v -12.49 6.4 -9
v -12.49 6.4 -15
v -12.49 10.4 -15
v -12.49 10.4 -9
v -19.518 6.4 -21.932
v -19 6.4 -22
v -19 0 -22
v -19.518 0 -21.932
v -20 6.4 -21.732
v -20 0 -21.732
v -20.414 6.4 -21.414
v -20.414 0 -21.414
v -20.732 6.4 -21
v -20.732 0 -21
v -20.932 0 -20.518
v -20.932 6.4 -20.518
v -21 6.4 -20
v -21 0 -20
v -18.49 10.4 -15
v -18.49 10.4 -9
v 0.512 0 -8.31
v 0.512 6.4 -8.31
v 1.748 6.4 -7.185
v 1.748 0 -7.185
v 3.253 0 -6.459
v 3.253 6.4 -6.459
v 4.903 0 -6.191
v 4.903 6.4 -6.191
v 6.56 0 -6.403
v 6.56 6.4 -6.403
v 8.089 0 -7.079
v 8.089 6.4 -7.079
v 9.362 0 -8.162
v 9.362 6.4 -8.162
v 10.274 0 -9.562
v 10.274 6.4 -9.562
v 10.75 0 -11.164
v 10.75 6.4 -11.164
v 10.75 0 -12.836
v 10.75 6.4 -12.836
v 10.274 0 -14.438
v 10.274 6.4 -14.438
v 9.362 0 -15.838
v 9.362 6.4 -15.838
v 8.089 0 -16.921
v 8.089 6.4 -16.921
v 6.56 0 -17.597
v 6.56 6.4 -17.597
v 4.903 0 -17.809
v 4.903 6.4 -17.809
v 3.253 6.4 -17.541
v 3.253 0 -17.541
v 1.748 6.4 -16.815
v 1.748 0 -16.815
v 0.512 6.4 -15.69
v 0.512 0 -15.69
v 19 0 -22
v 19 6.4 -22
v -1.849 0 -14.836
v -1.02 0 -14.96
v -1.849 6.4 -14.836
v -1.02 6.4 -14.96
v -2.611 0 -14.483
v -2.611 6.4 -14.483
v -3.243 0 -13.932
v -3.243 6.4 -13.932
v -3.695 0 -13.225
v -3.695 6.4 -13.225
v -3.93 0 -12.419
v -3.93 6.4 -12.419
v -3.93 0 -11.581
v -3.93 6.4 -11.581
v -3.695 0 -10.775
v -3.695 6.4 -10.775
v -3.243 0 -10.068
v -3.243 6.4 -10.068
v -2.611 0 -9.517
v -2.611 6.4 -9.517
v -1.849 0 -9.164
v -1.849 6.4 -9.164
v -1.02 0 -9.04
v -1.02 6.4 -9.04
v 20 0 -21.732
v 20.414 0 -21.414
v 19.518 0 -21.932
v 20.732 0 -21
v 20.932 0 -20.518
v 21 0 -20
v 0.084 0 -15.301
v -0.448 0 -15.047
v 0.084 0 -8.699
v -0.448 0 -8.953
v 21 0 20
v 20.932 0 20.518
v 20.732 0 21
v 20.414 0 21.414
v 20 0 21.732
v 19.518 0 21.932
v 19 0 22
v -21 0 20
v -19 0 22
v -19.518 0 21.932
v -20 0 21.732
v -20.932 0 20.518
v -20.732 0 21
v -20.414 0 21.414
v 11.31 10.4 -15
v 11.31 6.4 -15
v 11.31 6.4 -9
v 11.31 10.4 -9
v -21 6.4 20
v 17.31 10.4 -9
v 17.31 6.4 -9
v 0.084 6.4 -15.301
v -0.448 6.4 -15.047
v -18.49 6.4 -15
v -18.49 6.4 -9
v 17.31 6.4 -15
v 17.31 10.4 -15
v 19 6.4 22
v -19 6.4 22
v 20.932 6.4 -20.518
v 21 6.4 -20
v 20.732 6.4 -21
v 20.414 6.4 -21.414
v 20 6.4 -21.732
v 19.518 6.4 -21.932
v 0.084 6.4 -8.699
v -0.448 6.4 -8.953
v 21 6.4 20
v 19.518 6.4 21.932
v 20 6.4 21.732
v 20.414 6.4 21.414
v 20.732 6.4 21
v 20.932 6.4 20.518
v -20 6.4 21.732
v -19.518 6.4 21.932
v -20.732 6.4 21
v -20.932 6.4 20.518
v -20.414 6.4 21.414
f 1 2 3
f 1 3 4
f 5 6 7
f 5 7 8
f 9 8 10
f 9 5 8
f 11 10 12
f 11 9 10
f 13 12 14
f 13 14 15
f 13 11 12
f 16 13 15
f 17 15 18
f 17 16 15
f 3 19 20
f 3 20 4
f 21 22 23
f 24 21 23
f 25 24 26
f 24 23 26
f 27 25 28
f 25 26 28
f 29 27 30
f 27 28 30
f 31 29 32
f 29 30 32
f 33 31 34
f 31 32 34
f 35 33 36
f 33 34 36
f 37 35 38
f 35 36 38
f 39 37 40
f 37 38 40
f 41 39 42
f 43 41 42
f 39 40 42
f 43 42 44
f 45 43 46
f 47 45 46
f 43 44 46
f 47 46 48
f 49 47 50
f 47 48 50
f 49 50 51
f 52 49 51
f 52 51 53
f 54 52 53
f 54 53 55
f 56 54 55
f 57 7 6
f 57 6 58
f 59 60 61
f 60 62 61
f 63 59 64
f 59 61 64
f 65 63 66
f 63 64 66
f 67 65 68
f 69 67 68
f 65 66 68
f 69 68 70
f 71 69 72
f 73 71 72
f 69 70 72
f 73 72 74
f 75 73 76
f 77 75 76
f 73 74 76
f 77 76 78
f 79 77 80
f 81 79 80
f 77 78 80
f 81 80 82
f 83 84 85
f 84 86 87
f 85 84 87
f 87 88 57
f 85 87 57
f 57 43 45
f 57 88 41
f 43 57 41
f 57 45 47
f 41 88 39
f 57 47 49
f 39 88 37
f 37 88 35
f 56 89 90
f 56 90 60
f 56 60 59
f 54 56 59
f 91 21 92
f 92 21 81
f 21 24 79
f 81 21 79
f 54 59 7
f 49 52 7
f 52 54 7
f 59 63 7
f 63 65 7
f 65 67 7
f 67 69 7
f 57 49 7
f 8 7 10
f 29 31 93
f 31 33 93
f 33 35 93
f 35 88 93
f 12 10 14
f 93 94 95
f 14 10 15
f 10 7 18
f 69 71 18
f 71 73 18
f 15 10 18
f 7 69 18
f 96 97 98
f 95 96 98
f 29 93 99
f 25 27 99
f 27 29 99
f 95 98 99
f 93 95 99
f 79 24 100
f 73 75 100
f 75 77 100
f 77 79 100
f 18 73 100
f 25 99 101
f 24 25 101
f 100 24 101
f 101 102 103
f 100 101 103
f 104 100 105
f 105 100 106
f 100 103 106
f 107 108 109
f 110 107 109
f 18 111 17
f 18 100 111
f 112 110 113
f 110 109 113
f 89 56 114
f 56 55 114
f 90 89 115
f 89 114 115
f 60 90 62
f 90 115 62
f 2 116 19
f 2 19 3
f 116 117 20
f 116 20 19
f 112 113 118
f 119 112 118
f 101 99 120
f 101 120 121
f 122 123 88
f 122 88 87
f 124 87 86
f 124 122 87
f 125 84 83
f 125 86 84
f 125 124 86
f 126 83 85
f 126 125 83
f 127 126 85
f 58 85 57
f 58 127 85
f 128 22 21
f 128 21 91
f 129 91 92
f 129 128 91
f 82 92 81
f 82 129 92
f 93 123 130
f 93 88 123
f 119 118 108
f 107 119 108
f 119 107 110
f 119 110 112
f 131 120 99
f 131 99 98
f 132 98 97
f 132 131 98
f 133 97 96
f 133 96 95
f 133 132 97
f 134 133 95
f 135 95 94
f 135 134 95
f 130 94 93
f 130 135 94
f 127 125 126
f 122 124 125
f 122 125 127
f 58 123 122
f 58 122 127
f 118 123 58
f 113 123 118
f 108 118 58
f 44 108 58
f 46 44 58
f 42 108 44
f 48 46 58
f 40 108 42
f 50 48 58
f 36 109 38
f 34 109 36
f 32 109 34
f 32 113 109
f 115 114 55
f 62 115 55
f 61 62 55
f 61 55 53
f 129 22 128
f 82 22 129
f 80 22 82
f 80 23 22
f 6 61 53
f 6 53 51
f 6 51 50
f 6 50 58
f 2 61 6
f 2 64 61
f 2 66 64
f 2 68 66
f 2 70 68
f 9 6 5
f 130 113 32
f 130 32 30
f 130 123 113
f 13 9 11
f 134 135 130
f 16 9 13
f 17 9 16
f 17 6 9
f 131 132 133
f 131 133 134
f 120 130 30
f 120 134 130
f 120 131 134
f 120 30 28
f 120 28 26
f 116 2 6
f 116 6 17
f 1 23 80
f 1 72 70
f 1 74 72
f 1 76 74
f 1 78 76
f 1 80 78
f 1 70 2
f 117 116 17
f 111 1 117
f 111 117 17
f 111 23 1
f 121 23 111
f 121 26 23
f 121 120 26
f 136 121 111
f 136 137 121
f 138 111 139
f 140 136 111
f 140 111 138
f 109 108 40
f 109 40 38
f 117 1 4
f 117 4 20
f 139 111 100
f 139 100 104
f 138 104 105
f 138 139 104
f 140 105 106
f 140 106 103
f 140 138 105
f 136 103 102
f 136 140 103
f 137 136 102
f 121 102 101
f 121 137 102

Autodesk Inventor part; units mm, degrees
ref_plane "YZ Plane" through (0, 0, 0) normal (1, 0, 0) x (0, 1, 0)
ref_plane "XZ Plane" through (0, 0, 0) normal (0, 1, 0) x (-1, 0, 0)
ref_plane "XY Plane" through (0, 0, 0) normal (0, 0, 1) x (1, 0, 0)
sketch "Sketch1" plane through (0, 0, 0) normal (0, 1, 0) x (-1, 0, 0)
  line L0 (-21, 22) -> (21, 22)
  line L1 (21, 22) -> (21, -22)
  line L2 (21, -22) -> (-21, -22)
  line L3 (-21, -22) -> (-21, 22)
  line L4 (-21, 22) -> (21, -22) construction
  line L5 (21, 22) -> (-21, -22) construction
  point P0 (0, 0)
  dimension "d0" = 42
  dimension "d1" = 44
extrude "wall2" add sketch "Sketch1" along normal blind 6.4
sketch "Sketch7" plane through (0, 6.4, 0) normal (0, 1, 0) x (1, 0, 0)
  line L0 (5, -22) -> (5, 22) construction
  line L1 (21, 22) -> (-21, 22) projected
  line L2 (-21, -22) -> (21, -22) projected
  line L3 (-21, 12) -> (21, 12) construction
  line L4 (21, -22) -> (21, 22) projected
  line L5 (-21, 22) -> (-21, -22) projected
  circle A0 centre (5, 12) radius 5.81
  point P0 (0, 0)
  dimension "d74" = 34
  dimension "d75" = 26
  dimension "d76" = 11.62
extrude "bigcircle" cut sketch "Sketch7" against normal blind 6.4 contours A0
sketch "Sketch8" plane through (0, 6.4, 0) normal (0, 1, 0) x (1, 0, 0)
  line L0 (-21, -22) -> (-21, 22) projected
  line L1 (-21, 12) -> (21, 12) construction
  line L2 (21, 22) -> (21, -22) projected
  line L3 (5, 22) -> (5, -22) construction
  line L4 (21, -22) -> (21, 22) projected
  line L5 (21, 22) -> (-21, 22) projected
  line L6 (-21, -22) -> (21, -22) projected
  circle A0 centre (-1, 12) radius 2.96
  point P0 (0, 0)
  dimension "d81" = 26
  dimension "d82" = 34
  dimension "d83" = 5.92
  dimension "d84" = 6
extrude "smallcircle" cut sketch "Sketch8" against normal blind 6.4 contours A0
fillet "Fillet4" radius 2 2 edges at (-0.0829, 3.2, -9.1857) (-0.0829, 3.2, -14.8143)
fillet_without_effect "Fillet5"
fillet "Fillet6" radius 2 1 edges at (-21, 3.2, -22)
fillet "Fillet7" radius 2 1 edges at (21, 3.2, -22)
fillet "Fillet8" radius 2 1 edges at (-21, 3.2, 22)
fillet "Fillet9" radius 2 1 edges at (21, 3.2, 22)
sketch "Sketch9" plane through (0, 6.4, 0) normal (0, 1, 0) x (1, 0, 0)
  line L0 (11.31, 17.1525) -> (11.31, -6.1616) construction
  line L1 (10.81, 14.2171) -> (10.81, 9.0836) construction
  arc A0 (0.512, 8.3102) -> (0.512, 15.6898) centre (5, 12) ccw projected
  line L2 (-21, 12) -> (18.6779, 12) construction
  line L3 (11.31, 9) -> (17.31, 9)
  line L4 (17.31, 9) -> (17.31, 15)
  line L5 (17.31, 15) -> (11.31, 15)
  line L6 (11.31, 15) -> (11.31, 9)
  line L7 (11.31, 9) -> (17.31, 15) construction
  line L8 (17.31, 9) -> (11.31, 15) construction
  line L9 (-21, 20) -> (-21, -20) projected
  line L10 (-18.49, 15) -> (-12.49, 15)
  line L11 (-12.49, 15) -> (-12.49, 9)
  line L12 (-12.49, 9) -> (-18.49, 9)
  line L13 (-18.49, 9) -> (-18.49, 15)
  line L14 (-18.49, 15) -> (-12.49, 9) construction
  line L15 (-12.49, 15) -> (-18.49, 9) construction
  point P0 (0, 0)
  point P1 (14.31, 12)
  point P2 (-15.49, 12)
  dimension "d93" = 0.5
  dimension "d94" = 6
  dimension "d95" = 23.3
extrude "Extrusion7" add sketch "Sketch9" along normal blind 4
equation "\"d0\" = wallw"
equation "\"d1\" = wallh"
equation "\"d72\" = wall2_thick"
equation "\"d74\" = distancefrombottom"
equation "\"d75\" = distancefromleft"
equation "\"d76\" = servobigcircledia"
equation "\"d79\" = wall2_thick"
equation "\"d81\" = distancefromleft"
equation "\"d82\" = distancefrombottom"
equation "\"d83\" = servosmallcircledia"
equation "\"d85\" = wall2_thick"
equation "\"d89\" = cornerrad"
equation "\"d90\" = cornerrad"
equation "\"d91\" = cornerrad"
equation "\"d92\" = cornerrad"
equation "\"d94\" = servomountsquare"
equation "\"d96\" = servomounth"
equation "\"printer3dtolerance\" = 0.12"
equation "\"wallw\" = 42"
equation "\"wallh\" = 44"
equation "\"cornerrad\" = 2"
equation "\"baseextra\" = 2"
equation "\"wall1_thick\" = 8"
equation "\"wall2_thick\" = 6.4"
equation "\"wall3_thick\" = 4"
equation "\"wall1slot\" = 8.12"
equation "\"wall2slot\" = 6.52"
equation "\"wall3slot\" = 4.12"
equation "\"gap2\" = 28"
equation "\"baseh\" = 79.12"
equation "\"basew\" = 44"
equation "\"base_thick\" = 6"
equation "\"base_slots_depth\" = 4"
equation "\"servomounth\" = 4"
equation "\"servosmallcircledia\" = 5.92"
equation "\"servomountsquare\" = 6"
equation "\"servobigcircledia\" = 11.62"
equation "\"servo9gw\" = 22.8"
equation "\"distancefromleft\" = 26"
equation "\"servopolygonl\" = 5.92"
equation "\"servopolygonr\" = 6.12"
equation "\"distancefrombottom\" = 34"
equation "\"d49\" = distancefrombottom"
equation "\"adapterh\" = 16"
equation "\"wall3slotd\" = 2"
equation "\"adapterw\" = 32"
equation "\"wall3slotd_1\" = 2"
equation "\"wall3slotw\" = 36"
properties part number "wall-middle" material "Wood (Oak)"
